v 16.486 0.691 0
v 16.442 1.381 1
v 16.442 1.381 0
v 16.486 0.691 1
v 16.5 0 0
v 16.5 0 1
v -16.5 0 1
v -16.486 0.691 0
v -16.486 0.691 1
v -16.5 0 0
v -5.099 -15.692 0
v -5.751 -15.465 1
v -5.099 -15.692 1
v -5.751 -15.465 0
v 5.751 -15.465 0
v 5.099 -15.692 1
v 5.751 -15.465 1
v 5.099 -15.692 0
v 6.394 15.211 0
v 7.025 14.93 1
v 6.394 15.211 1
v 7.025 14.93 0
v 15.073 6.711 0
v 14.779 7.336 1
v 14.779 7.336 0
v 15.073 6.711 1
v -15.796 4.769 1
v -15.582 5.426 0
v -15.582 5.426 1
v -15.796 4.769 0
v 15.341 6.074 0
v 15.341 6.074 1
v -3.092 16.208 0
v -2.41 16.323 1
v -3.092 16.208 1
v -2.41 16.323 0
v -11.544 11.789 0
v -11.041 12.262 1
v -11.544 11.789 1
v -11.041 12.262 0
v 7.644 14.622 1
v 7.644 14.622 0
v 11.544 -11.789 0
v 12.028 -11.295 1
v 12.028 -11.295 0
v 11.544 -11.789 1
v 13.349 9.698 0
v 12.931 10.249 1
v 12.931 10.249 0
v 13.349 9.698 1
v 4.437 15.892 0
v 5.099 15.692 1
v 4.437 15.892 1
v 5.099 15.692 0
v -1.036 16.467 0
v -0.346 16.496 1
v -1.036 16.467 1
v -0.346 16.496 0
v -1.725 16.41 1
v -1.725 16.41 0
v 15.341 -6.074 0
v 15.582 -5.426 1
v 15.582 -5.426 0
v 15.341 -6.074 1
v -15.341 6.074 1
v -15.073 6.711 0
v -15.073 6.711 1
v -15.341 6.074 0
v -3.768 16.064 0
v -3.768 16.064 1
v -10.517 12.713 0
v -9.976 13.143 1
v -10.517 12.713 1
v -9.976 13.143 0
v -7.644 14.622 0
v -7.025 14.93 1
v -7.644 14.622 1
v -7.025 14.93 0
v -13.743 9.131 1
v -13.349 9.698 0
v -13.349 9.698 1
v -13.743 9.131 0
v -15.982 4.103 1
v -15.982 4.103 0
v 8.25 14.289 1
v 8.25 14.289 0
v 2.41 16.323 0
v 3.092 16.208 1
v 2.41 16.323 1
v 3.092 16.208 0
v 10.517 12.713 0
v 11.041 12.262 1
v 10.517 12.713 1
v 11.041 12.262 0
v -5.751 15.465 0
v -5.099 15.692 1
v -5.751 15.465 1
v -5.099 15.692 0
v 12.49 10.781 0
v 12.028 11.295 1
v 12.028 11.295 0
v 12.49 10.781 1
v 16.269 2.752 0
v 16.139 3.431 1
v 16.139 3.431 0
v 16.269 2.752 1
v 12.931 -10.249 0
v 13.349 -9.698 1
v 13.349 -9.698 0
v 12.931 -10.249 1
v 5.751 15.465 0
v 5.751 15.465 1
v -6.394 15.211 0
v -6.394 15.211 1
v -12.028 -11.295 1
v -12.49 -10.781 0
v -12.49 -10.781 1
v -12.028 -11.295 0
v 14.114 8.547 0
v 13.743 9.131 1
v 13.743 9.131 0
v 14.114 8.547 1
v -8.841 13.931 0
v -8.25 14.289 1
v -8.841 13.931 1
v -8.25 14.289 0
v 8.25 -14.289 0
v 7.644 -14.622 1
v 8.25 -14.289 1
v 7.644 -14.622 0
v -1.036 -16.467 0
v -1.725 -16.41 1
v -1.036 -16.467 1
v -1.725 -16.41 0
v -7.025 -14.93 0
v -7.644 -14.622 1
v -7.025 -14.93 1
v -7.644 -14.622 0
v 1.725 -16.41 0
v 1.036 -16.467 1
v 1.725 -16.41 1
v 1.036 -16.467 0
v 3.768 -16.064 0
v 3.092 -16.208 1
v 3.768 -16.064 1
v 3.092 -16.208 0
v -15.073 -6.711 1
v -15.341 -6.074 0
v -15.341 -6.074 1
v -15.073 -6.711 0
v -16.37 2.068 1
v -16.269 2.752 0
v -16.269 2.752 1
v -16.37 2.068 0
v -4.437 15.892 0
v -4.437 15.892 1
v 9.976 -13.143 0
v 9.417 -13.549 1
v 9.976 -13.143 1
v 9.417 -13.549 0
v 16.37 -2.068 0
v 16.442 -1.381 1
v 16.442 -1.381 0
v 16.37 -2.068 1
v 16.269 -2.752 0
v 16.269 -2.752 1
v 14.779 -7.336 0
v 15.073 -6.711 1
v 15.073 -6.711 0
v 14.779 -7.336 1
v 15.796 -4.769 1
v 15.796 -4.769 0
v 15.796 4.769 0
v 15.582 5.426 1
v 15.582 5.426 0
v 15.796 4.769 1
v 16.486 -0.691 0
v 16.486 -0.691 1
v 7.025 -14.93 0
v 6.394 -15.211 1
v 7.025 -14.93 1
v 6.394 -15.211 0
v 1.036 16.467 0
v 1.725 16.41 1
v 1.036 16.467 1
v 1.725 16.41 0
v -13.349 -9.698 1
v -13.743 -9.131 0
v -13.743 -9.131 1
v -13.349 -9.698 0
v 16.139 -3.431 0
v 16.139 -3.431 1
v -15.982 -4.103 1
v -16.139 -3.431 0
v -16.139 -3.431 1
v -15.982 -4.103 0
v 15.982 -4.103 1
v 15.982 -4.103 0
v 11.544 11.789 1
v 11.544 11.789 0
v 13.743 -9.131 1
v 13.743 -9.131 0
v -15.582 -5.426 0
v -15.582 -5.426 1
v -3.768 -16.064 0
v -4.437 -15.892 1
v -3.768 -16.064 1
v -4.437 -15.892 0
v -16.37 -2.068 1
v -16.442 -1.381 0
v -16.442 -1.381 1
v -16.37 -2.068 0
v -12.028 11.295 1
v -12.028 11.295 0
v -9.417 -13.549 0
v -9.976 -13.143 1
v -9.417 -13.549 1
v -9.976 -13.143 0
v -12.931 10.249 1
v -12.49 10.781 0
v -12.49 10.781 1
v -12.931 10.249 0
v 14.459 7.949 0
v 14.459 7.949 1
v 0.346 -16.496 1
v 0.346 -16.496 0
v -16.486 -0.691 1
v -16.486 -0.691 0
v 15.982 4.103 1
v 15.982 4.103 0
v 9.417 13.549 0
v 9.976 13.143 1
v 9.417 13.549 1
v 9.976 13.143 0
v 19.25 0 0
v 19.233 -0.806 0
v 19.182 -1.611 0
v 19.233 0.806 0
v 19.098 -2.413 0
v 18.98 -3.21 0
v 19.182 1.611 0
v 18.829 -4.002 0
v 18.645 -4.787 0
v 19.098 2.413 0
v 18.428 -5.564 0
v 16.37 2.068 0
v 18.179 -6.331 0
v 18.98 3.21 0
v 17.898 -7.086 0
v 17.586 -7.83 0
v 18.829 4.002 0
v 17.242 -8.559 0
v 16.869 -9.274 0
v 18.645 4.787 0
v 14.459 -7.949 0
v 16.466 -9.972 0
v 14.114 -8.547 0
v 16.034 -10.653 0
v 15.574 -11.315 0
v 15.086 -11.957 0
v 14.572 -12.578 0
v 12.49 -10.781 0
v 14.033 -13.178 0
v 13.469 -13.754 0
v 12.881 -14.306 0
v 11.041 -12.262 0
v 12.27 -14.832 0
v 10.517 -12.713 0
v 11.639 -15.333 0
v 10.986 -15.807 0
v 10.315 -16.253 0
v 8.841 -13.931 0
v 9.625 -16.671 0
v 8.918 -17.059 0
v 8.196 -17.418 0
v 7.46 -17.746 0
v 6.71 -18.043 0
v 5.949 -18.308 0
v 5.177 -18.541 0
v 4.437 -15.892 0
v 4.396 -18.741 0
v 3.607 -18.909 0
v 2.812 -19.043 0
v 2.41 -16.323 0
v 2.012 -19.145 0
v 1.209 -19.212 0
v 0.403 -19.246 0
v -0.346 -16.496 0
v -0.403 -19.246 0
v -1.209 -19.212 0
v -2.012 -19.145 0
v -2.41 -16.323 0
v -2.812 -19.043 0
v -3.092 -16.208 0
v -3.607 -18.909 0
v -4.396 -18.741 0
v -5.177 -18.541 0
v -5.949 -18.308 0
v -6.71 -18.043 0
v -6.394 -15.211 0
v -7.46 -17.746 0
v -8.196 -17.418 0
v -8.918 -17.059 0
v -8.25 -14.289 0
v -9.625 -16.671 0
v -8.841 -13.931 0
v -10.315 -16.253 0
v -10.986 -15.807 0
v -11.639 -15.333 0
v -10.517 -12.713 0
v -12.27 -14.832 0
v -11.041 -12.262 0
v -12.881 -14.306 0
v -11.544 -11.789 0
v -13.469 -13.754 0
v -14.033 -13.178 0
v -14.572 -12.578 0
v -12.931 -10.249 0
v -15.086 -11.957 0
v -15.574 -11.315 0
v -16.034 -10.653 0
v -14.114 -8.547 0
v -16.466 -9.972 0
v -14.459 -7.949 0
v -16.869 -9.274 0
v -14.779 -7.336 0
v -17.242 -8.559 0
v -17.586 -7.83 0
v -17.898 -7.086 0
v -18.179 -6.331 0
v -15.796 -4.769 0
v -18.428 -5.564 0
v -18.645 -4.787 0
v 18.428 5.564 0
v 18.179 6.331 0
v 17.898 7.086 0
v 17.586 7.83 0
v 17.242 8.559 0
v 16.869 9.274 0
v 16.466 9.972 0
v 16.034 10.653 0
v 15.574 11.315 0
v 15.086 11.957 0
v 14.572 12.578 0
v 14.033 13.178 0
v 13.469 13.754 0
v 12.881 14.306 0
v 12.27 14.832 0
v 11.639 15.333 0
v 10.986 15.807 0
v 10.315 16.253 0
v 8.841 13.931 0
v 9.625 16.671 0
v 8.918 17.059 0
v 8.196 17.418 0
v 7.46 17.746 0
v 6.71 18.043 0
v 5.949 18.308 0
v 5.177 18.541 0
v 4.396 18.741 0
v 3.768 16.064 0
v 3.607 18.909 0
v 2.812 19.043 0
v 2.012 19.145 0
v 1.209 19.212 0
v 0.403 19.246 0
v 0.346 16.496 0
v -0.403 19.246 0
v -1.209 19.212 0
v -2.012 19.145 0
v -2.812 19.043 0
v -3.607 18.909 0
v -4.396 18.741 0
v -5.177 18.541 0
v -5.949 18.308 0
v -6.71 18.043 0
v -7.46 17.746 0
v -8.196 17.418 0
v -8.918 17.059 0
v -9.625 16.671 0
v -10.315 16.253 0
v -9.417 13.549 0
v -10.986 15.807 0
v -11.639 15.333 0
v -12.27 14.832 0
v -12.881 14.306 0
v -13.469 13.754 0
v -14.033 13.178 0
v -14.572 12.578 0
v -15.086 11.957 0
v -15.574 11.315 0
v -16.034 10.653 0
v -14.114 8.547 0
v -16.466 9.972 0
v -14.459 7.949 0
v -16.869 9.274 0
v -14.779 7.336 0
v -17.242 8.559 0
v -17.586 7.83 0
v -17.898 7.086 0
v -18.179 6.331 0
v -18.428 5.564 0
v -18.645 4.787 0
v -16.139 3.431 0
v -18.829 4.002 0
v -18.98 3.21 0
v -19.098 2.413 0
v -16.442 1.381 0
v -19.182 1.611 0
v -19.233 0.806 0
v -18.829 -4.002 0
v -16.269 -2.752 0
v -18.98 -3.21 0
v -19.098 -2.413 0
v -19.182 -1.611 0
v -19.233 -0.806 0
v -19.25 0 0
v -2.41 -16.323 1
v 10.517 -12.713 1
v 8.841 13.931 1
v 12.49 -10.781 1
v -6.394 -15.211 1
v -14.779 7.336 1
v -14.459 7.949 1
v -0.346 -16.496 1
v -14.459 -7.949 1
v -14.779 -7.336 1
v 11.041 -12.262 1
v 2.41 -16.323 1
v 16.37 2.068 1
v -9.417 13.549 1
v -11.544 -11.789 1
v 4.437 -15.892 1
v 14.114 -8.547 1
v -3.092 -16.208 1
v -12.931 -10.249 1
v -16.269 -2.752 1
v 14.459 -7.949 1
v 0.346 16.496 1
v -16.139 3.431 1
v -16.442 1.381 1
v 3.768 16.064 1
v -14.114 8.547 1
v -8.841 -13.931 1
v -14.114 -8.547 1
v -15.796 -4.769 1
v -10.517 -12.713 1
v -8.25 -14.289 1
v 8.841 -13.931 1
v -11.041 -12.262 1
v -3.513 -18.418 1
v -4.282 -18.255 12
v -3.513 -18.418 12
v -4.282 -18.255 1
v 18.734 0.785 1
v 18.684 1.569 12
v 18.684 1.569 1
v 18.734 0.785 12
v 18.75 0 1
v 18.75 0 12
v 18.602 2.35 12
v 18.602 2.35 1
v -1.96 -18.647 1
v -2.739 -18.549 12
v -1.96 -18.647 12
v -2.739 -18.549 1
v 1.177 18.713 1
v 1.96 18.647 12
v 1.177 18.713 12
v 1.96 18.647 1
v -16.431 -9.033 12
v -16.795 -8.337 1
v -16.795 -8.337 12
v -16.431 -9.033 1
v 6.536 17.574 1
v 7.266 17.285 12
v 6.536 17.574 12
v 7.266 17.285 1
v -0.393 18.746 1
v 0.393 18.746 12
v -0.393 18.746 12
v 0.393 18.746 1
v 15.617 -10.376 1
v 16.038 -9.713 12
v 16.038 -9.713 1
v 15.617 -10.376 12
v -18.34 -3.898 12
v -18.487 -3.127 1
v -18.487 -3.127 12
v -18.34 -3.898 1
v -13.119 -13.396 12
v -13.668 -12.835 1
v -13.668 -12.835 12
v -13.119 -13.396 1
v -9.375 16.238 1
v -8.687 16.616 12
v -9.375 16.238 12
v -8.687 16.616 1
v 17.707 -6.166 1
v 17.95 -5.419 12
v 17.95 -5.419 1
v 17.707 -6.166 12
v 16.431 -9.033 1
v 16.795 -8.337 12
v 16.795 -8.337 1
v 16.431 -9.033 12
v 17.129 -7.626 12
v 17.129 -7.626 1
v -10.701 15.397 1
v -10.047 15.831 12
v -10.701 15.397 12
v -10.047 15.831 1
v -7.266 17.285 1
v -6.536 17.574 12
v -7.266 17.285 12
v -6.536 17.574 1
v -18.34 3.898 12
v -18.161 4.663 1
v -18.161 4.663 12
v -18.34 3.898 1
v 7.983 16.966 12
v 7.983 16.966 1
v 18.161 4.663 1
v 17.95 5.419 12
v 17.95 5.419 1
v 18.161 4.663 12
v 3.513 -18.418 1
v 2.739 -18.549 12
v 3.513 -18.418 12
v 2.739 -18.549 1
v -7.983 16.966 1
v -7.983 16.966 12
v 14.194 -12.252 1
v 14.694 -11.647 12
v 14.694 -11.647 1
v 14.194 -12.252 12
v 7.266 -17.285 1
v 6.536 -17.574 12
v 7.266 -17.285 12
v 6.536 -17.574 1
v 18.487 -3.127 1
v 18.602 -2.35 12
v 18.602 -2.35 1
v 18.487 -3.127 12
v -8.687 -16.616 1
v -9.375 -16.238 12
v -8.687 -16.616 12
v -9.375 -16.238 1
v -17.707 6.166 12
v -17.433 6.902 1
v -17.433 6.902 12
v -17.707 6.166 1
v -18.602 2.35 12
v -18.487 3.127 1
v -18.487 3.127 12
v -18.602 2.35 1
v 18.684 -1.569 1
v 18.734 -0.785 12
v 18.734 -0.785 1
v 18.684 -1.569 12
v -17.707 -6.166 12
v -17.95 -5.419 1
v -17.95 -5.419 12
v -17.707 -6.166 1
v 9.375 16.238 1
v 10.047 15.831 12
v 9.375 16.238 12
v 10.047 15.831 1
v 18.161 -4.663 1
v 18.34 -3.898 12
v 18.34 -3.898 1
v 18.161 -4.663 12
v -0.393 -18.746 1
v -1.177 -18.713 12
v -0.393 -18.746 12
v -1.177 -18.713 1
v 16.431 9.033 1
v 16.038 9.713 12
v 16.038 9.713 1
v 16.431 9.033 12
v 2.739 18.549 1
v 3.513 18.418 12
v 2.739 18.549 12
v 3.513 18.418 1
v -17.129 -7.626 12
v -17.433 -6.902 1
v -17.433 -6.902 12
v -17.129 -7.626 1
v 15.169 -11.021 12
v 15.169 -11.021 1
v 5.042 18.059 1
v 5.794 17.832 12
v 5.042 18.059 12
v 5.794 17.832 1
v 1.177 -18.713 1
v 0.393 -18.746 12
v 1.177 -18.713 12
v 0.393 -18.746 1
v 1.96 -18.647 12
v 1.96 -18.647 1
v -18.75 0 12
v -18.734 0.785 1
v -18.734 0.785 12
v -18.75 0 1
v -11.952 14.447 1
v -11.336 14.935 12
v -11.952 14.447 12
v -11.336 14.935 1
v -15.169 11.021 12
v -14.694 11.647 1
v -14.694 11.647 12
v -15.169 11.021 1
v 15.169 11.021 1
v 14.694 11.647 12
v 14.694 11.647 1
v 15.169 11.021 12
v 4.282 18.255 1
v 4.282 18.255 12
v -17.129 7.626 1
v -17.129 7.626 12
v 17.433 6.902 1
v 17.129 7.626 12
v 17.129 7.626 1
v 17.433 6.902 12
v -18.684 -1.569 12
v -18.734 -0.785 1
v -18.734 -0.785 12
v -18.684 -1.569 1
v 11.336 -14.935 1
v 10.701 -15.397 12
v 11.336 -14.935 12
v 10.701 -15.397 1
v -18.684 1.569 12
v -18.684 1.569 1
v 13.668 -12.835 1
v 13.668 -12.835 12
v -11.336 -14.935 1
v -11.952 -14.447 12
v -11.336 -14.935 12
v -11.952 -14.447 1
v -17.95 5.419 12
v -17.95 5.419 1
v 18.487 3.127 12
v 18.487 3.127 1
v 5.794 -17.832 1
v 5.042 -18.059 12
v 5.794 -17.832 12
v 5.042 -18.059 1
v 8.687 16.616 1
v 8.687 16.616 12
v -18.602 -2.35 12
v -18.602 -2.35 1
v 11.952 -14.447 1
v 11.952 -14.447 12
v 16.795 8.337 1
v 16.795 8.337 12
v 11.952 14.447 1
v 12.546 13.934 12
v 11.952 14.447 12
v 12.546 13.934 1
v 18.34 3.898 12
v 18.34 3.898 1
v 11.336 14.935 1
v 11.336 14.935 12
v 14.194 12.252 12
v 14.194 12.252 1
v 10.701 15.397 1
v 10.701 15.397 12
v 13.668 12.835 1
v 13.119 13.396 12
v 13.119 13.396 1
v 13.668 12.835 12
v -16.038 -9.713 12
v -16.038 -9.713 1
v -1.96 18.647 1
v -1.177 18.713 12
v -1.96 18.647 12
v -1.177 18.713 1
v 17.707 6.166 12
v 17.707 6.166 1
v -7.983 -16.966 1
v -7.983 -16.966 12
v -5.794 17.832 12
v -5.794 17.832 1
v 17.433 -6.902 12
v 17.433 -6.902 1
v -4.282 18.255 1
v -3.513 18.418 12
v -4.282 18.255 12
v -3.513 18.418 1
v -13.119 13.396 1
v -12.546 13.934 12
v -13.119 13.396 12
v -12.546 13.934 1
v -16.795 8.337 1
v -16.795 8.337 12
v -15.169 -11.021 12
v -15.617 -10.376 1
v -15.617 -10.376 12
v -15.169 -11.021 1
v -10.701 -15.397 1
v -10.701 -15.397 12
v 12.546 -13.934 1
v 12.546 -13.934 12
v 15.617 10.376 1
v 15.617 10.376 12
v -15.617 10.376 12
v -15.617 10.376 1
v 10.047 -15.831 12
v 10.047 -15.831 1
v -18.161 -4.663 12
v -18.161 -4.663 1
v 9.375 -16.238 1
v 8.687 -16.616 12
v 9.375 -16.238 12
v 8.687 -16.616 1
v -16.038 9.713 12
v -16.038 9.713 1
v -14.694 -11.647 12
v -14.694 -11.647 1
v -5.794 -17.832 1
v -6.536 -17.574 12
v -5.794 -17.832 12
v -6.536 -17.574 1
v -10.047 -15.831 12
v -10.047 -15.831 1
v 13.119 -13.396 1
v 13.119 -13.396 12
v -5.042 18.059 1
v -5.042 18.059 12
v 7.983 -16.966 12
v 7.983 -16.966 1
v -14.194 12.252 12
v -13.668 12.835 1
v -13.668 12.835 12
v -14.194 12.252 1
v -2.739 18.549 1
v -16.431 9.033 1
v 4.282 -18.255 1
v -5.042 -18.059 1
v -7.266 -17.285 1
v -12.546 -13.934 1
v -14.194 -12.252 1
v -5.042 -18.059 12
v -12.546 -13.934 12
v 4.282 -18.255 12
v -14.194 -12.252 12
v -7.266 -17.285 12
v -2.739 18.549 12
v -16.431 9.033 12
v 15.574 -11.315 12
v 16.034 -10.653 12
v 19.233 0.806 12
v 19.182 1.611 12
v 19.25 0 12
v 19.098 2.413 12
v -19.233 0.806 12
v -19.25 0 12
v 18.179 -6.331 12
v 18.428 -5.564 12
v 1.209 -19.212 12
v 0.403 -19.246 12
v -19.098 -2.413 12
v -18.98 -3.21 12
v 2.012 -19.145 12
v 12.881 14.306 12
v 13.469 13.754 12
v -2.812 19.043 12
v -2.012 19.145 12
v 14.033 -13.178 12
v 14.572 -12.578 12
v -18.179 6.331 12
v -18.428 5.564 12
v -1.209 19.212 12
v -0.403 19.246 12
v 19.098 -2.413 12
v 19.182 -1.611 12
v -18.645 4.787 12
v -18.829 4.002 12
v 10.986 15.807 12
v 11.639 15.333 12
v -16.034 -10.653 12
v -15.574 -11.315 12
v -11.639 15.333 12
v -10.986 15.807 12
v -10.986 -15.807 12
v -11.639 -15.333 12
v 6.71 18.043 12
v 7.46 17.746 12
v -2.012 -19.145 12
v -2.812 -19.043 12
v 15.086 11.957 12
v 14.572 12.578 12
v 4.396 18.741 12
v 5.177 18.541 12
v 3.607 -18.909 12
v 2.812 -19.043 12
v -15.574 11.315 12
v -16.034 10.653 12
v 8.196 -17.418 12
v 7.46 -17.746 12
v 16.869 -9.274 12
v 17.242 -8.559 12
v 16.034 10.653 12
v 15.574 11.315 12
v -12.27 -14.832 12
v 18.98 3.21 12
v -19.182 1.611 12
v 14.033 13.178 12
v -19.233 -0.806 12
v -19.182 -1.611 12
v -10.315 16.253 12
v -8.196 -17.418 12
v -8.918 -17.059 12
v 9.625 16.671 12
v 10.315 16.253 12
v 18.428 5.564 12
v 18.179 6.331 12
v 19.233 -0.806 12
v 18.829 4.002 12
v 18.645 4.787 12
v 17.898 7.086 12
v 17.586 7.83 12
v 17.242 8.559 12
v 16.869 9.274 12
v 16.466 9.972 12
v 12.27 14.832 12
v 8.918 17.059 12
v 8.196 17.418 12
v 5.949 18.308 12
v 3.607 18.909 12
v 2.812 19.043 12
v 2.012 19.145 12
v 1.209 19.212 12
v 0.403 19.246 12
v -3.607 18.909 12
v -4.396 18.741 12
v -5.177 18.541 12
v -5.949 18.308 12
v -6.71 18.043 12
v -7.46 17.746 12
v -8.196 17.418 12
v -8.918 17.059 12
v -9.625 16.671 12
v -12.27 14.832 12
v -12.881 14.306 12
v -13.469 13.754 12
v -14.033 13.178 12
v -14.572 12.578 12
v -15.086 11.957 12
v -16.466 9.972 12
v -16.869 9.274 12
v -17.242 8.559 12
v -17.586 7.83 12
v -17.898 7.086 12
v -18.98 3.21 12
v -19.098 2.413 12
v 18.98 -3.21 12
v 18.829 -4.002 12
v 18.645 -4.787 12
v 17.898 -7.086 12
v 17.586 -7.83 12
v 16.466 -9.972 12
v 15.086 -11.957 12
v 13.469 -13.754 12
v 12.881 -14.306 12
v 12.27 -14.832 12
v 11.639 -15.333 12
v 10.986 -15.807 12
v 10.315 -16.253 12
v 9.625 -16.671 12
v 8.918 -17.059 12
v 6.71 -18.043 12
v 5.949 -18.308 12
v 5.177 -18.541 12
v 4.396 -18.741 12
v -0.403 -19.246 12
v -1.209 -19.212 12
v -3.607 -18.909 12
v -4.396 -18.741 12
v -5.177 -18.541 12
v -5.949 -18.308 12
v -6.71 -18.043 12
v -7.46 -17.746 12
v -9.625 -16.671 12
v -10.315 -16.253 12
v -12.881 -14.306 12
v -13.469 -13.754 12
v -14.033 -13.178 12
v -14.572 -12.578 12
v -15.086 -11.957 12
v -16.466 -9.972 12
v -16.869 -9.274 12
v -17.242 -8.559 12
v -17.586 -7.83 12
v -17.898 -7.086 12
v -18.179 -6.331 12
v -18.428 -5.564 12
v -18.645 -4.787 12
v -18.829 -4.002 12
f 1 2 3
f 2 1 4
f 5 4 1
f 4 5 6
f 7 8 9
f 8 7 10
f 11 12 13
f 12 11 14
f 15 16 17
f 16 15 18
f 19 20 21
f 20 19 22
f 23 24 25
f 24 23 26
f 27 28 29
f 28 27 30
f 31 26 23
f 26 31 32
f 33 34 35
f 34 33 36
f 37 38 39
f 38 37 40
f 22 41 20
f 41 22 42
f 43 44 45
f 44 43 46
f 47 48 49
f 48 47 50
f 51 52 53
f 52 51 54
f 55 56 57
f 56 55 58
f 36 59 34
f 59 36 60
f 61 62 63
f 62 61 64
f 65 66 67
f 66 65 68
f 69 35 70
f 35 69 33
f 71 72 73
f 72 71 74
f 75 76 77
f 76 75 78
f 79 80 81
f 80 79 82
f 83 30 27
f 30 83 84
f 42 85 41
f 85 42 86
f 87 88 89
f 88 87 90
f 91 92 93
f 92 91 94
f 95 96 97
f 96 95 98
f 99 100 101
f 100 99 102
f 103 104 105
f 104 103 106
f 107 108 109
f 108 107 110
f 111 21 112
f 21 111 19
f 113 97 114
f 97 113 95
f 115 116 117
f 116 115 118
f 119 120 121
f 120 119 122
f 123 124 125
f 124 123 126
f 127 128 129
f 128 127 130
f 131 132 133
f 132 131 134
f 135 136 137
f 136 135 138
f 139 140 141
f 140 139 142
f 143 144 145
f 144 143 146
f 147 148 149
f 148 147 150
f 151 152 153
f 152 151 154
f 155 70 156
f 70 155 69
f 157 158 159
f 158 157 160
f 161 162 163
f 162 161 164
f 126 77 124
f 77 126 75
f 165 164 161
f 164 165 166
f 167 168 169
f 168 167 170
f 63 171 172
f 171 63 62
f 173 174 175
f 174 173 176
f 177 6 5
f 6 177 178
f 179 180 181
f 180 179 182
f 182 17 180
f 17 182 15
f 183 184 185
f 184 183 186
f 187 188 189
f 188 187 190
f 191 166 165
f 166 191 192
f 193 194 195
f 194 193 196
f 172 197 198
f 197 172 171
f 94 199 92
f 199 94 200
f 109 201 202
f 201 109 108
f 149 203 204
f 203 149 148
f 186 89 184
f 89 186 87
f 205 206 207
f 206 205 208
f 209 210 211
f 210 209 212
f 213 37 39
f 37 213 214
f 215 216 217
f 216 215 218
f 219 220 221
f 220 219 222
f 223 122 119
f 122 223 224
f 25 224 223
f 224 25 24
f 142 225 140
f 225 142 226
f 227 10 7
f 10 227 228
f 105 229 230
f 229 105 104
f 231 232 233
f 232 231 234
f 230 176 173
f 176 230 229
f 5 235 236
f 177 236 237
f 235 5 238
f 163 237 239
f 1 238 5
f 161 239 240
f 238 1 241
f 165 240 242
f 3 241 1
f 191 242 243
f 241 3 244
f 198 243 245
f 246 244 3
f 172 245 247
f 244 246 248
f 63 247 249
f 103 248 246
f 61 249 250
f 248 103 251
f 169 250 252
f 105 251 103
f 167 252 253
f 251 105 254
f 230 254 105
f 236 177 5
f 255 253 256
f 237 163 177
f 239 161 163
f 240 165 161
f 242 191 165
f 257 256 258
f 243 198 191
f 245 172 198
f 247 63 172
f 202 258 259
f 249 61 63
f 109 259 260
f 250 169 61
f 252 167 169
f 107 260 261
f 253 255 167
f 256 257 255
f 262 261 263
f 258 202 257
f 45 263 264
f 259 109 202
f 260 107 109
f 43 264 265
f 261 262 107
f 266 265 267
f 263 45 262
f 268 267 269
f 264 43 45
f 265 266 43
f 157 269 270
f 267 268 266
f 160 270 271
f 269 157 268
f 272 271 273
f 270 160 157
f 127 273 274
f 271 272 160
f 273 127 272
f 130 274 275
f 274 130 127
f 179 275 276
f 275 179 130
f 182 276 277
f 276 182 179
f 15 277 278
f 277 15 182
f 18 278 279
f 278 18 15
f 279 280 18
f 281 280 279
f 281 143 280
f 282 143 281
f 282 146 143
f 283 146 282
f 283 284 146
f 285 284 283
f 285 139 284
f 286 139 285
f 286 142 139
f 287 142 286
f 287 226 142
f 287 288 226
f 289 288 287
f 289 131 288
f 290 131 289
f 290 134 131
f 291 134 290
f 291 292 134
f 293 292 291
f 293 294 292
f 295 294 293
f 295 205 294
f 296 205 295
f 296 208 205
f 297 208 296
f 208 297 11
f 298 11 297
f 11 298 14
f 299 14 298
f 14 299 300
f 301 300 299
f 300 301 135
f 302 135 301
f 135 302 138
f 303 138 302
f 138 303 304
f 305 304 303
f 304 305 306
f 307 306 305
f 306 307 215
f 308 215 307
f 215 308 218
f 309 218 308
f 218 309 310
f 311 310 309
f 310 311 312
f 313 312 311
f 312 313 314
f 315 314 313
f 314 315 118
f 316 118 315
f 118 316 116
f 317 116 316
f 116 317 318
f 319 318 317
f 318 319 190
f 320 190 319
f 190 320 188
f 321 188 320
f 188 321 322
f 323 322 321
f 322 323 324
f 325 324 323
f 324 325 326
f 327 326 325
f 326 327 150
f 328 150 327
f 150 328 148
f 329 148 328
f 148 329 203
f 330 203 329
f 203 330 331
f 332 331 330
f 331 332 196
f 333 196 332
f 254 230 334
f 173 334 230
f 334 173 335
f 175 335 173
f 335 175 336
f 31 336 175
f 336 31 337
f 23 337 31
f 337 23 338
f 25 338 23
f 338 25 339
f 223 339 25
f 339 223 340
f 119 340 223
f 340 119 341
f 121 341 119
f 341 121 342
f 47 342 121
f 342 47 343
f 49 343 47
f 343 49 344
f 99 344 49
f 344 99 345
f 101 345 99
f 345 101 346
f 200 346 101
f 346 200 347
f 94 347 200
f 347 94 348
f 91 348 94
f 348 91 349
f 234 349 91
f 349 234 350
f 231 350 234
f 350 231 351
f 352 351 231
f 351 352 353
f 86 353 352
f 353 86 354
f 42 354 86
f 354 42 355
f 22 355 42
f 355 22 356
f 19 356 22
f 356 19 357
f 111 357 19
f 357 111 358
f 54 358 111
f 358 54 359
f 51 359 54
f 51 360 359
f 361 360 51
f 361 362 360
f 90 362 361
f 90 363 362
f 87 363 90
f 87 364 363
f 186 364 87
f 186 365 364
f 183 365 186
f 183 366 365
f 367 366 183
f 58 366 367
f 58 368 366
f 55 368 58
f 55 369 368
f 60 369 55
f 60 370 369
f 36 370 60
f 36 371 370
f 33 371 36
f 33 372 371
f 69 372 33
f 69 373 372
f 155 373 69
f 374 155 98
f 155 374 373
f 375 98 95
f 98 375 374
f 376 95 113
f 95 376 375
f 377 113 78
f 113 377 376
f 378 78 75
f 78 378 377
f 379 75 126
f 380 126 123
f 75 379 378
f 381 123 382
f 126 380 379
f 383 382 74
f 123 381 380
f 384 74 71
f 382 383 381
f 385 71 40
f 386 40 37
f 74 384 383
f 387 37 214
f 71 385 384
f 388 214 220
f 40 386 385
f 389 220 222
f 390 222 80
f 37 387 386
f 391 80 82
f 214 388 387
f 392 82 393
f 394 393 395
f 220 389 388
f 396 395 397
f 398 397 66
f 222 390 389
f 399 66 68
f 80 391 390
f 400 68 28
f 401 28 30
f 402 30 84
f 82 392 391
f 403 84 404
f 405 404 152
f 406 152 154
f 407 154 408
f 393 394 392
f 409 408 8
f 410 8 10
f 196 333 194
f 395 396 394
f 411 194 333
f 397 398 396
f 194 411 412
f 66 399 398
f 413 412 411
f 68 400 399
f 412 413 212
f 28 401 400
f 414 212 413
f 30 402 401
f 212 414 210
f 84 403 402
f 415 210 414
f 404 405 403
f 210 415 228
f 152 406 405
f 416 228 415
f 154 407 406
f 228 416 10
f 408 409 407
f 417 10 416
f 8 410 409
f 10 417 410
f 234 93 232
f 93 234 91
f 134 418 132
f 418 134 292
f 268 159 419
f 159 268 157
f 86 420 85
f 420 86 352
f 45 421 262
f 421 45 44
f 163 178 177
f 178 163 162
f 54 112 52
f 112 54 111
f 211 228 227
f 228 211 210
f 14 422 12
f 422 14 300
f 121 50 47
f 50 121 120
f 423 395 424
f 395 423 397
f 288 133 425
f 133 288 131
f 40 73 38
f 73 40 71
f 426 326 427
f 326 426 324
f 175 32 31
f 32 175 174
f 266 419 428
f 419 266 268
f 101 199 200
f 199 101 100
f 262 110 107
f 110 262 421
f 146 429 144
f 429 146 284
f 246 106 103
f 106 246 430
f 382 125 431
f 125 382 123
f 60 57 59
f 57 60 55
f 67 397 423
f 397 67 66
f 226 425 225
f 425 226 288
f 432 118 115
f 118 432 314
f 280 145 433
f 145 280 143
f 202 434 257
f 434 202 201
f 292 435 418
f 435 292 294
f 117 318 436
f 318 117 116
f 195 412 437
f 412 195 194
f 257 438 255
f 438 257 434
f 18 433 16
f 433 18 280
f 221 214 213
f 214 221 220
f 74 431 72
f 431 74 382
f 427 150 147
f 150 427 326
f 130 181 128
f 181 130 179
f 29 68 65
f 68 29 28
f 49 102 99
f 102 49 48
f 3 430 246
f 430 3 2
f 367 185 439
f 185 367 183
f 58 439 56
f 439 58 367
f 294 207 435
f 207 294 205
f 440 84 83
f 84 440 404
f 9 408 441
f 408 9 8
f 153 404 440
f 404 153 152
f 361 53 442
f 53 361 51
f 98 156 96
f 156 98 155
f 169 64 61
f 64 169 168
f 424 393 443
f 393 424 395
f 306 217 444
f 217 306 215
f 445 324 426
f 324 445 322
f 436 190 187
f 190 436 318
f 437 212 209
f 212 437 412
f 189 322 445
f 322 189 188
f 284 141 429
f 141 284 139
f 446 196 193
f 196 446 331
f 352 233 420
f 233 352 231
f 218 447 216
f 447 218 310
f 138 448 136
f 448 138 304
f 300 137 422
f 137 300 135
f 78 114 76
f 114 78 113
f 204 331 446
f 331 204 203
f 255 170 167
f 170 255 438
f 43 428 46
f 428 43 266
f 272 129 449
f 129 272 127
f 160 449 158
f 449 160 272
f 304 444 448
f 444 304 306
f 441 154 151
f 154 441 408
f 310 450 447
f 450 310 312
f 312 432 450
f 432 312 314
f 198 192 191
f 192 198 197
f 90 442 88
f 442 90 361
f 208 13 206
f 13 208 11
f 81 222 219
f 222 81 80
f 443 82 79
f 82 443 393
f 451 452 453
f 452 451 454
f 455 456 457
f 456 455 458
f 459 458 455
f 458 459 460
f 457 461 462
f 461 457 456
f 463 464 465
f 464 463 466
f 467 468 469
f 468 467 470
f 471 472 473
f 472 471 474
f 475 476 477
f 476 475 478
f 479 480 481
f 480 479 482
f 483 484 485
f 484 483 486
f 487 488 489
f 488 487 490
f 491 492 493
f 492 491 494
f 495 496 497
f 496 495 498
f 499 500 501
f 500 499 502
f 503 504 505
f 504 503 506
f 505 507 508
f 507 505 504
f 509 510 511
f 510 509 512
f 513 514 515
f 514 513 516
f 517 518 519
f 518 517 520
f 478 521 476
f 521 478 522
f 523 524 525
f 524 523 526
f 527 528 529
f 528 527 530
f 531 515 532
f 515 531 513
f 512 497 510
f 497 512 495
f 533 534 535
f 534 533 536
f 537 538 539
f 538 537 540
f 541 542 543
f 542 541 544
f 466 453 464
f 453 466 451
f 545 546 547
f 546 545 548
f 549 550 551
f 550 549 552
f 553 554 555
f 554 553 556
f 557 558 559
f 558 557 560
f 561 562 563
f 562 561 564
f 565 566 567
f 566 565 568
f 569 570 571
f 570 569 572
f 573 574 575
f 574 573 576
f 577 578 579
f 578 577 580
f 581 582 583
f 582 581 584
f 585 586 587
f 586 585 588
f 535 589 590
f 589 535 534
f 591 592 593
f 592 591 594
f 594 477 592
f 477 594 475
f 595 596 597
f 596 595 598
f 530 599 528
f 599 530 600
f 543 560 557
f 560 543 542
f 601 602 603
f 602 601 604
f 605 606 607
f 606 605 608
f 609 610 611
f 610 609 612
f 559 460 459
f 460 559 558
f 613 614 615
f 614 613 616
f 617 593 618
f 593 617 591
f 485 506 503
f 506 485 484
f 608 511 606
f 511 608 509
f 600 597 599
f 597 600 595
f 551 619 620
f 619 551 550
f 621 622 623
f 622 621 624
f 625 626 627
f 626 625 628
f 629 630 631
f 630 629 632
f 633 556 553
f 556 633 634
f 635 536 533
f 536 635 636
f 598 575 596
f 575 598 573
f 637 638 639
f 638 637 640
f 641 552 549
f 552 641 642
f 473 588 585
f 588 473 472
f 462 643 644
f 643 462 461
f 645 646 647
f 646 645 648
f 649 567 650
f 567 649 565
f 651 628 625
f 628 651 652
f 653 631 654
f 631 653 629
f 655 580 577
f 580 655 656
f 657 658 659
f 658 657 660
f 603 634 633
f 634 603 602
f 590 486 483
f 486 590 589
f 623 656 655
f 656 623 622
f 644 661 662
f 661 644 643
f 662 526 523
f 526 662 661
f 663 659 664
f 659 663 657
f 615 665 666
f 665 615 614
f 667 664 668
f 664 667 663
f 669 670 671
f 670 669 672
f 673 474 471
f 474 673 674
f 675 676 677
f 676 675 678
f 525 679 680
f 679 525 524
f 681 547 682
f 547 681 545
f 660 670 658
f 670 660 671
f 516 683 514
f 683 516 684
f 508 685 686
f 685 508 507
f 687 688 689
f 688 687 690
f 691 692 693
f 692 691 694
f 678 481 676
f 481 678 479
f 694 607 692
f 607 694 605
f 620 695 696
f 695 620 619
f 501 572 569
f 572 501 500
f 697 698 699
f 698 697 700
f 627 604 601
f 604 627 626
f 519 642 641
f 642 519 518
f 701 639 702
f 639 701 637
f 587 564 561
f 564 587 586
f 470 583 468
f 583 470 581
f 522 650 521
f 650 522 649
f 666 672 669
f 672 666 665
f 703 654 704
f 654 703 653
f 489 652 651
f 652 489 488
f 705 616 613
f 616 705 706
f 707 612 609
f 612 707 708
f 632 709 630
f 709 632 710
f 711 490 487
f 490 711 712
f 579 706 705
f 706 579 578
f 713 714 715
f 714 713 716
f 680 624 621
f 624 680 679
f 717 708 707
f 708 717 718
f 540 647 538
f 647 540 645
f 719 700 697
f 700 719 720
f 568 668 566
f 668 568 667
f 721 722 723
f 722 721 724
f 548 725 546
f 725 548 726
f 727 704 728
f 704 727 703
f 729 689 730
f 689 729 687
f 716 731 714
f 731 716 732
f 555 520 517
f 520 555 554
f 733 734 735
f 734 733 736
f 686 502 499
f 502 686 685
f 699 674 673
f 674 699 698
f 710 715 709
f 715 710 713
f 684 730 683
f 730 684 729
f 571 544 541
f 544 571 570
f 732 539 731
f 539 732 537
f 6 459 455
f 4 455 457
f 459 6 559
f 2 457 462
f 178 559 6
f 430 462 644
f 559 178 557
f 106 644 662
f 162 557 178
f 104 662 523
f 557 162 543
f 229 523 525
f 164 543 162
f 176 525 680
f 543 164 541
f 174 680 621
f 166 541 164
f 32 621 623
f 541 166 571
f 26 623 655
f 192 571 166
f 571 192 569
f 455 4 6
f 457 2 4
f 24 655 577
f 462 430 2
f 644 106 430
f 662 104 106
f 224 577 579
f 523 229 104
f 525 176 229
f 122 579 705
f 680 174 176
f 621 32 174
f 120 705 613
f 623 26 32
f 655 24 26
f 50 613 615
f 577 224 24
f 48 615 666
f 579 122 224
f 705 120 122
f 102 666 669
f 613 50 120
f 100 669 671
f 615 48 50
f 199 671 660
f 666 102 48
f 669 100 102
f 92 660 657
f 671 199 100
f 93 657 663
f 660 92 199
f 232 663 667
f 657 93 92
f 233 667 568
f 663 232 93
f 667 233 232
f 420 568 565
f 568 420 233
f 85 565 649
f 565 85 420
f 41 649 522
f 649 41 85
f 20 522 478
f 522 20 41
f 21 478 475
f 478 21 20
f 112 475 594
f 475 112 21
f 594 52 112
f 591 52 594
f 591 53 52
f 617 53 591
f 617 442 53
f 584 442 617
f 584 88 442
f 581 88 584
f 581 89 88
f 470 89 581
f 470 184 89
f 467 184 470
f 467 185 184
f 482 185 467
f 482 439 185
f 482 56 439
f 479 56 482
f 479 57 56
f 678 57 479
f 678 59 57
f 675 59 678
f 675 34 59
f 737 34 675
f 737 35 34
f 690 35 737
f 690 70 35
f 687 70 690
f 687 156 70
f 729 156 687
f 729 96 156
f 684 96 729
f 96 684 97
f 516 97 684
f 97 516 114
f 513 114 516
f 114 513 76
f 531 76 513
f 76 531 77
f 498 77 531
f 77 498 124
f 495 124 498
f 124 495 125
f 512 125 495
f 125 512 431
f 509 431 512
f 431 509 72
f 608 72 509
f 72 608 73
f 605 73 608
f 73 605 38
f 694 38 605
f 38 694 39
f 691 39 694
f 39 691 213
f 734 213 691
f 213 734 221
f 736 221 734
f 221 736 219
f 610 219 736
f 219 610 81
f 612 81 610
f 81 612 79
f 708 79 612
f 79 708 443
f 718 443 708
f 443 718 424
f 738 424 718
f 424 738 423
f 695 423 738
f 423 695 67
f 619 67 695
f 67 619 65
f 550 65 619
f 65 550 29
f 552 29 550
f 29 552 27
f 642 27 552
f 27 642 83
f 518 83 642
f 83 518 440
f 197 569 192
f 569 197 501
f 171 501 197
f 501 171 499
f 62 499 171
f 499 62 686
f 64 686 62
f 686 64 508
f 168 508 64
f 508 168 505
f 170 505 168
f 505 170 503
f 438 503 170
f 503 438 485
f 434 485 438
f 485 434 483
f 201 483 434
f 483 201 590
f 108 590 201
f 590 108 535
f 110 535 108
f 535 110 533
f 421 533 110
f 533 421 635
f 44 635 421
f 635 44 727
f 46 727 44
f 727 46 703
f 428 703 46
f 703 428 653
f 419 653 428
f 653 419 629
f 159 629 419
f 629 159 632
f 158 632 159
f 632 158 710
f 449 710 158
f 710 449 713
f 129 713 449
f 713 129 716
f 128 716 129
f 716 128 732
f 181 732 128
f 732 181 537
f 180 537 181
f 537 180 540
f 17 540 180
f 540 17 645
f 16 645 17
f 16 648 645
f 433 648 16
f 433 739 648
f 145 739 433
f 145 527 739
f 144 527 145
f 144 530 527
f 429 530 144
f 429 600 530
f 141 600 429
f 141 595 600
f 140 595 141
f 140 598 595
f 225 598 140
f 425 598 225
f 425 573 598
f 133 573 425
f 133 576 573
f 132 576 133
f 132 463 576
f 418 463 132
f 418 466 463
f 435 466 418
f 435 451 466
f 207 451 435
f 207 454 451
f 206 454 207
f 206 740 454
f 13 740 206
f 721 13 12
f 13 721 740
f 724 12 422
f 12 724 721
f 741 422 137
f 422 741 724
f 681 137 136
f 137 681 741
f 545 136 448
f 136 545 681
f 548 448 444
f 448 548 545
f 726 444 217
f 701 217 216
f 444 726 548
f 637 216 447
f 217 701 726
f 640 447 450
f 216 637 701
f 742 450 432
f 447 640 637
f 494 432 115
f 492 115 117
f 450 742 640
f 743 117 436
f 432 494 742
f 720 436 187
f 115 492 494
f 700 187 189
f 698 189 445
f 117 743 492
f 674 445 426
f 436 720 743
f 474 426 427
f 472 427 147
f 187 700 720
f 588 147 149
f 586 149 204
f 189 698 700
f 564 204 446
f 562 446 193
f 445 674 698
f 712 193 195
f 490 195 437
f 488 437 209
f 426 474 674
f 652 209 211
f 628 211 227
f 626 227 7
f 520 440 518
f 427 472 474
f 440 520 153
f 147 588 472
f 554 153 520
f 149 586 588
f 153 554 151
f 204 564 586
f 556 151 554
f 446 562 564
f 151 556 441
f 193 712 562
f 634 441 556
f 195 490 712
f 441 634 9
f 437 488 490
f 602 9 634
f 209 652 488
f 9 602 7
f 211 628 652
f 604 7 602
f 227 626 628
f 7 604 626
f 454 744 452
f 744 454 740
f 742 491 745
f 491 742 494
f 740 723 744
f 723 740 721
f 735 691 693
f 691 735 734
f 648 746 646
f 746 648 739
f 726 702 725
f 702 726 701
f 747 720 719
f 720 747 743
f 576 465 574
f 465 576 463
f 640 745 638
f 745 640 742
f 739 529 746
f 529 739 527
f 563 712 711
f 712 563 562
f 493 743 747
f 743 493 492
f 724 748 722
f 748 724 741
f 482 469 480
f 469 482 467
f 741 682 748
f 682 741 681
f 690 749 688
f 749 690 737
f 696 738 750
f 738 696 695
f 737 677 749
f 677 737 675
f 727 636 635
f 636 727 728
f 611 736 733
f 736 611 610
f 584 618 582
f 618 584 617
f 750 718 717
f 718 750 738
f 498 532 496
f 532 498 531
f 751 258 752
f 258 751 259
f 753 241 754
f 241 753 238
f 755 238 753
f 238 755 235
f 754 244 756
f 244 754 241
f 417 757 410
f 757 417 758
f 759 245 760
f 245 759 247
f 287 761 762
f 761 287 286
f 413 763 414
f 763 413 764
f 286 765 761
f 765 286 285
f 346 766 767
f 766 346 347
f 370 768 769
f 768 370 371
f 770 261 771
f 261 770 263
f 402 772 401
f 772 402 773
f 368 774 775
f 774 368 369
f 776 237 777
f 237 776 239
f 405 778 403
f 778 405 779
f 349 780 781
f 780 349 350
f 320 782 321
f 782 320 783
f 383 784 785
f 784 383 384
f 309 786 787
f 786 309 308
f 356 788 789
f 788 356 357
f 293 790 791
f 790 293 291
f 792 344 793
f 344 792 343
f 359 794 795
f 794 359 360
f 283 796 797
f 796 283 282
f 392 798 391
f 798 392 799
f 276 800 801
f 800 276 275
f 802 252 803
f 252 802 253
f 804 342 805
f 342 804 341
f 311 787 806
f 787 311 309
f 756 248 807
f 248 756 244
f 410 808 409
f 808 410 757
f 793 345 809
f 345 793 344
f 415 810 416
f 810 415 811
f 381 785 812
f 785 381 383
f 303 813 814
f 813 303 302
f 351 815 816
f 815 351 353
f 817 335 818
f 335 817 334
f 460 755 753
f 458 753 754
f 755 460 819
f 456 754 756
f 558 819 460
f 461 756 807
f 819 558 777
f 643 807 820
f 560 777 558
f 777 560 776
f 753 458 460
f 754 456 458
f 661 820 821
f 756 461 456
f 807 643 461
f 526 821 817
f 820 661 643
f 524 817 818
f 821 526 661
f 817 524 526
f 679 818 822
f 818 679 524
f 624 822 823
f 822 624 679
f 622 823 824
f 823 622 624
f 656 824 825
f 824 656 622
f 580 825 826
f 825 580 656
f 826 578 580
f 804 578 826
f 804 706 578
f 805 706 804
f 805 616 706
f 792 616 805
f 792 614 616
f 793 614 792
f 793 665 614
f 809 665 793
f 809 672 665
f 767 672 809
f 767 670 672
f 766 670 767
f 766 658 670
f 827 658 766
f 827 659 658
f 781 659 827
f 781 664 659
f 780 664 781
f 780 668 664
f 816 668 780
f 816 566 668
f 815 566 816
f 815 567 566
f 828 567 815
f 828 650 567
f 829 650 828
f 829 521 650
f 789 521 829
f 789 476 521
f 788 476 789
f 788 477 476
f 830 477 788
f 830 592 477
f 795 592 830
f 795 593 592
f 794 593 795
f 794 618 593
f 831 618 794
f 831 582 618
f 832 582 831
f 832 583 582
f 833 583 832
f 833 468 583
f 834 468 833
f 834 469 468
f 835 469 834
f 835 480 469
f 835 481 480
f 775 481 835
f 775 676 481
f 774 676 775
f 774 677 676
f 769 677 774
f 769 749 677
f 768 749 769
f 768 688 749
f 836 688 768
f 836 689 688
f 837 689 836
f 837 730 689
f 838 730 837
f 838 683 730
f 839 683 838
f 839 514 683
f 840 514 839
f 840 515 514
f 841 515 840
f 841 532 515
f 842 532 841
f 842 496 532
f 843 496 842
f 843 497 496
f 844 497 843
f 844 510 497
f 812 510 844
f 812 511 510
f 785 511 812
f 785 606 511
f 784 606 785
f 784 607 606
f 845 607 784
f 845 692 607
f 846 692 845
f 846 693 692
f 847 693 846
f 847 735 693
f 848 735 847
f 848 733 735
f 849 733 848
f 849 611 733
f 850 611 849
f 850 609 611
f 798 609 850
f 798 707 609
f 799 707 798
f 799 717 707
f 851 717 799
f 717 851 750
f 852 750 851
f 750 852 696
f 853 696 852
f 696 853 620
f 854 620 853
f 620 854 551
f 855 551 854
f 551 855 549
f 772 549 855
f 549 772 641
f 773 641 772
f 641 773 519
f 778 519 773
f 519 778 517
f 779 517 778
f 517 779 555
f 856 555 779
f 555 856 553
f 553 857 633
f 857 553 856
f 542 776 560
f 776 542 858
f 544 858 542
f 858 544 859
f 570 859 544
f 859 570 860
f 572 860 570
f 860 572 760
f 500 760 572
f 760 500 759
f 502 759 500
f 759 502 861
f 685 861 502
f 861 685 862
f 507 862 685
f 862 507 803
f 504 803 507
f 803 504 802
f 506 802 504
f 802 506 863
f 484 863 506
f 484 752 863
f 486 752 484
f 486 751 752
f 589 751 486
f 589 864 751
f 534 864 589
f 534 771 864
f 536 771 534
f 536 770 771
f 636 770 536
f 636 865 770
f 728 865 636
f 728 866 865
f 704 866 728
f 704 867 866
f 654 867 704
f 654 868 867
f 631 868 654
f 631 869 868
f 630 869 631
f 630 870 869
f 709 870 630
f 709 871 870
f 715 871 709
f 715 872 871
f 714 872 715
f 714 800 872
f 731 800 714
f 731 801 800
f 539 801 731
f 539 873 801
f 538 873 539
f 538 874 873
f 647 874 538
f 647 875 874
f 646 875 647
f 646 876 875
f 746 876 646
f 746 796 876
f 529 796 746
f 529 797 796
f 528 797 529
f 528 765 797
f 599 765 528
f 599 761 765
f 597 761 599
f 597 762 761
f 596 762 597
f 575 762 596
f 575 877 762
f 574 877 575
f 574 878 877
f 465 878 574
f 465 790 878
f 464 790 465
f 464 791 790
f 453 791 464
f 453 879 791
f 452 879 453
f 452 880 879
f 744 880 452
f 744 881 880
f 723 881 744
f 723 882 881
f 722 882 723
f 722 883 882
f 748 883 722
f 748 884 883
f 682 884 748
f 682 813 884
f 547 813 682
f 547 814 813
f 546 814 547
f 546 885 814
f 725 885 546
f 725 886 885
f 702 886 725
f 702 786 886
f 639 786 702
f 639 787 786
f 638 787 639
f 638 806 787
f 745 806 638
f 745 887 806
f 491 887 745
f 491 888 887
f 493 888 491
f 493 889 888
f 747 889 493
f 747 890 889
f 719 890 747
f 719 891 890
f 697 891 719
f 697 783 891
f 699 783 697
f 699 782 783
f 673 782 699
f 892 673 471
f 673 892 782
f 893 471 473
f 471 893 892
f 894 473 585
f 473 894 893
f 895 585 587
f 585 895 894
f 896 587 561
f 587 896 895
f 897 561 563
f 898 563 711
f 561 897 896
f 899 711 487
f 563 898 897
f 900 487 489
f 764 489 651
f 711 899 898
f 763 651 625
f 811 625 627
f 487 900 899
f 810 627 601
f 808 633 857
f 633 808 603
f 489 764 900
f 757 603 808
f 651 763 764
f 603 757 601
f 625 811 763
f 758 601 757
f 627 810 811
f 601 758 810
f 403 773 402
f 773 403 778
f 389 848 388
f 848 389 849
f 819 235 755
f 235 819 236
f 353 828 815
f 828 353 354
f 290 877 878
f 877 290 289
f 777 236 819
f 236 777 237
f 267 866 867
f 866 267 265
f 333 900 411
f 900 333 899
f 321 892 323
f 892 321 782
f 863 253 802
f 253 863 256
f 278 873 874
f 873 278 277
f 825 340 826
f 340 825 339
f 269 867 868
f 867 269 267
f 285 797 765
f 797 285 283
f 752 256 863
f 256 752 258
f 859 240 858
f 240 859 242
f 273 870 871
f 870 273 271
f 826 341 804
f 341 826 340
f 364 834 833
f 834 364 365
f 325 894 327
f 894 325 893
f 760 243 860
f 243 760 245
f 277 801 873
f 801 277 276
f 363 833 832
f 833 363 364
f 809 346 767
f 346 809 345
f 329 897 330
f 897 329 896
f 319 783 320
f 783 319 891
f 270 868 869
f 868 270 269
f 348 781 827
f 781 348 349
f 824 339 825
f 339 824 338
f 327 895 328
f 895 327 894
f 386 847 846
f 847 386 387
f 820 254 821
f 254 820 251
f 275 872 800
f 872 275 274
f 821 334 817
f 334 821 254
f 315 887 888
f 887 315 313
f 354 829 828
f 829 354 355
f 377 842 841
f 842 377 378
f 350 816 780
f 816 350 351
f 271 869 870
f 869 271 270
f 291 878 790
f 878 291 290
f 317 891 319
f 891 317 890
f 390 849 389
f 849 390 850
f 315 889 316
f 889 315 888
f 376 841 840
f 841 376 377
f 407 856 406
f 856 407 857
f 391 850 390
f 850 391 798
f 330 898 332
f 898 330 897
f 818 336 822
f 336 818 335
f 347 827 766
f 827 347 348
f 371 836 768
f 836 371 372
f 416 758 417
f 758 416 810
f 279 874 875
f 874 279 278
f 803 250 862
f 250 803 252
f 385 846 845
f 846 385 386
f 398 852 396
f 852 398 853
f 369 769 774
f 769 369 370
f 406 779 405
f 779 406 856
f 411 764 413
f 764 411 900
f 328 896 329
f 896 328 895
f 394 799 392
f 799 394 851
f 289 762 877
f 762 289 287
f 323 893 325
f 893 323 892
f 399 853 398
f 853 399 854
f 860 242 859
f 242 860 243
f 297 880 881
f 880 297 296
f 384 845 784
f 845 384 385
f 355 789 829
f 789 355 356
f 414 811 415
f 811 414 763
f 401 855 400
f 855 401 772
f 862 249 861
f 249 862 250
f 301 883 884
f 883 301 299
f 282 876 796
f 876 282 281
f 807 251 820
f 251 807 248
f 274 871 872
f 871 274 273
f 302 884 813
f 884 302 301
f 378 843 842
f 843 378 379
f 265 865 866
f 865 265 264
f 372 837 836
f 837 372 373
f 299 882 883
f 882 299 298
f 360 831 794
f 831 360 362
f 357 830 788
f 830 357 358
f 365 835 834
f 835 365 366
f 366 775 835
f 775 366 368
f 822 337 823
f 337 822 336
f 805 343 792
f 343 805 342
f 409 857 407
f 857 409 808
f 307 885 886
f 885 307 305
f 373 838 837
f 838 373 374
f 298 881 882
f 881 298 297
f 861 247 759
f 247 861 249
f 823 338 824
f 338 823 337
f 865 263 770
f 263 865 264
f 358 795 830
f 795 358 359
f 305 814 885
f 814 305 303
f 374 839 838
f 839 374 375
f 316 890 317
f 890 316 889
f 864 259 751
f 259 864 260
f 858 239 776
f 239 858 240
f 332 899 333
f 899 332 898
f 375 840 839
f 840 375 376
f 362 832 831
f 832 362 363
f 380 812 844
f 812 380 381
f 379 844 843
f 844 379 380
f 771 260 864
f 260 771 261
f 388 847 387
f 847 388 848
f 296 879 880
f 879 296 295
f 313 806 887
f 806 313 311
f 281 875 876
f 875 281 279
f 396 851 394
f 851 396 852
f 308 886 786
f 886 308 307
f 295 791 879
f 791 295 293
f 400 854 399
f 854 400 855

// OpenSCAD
/*
Limec pro opravu pumpicky na mice, co rozbil Mates
*/

$fn=150;

difference(){
    translate([0,0,0])cylinder(h=12, d=38.5, center=false); //vnejsi obal
    union(){
        cylinder(h=20, r=16.5, center=false); //dira na hridel
        translate([0,0,+1])cylinder(h=20, d=37.5, center=false); //dira na pist
        }//union
}//diff
